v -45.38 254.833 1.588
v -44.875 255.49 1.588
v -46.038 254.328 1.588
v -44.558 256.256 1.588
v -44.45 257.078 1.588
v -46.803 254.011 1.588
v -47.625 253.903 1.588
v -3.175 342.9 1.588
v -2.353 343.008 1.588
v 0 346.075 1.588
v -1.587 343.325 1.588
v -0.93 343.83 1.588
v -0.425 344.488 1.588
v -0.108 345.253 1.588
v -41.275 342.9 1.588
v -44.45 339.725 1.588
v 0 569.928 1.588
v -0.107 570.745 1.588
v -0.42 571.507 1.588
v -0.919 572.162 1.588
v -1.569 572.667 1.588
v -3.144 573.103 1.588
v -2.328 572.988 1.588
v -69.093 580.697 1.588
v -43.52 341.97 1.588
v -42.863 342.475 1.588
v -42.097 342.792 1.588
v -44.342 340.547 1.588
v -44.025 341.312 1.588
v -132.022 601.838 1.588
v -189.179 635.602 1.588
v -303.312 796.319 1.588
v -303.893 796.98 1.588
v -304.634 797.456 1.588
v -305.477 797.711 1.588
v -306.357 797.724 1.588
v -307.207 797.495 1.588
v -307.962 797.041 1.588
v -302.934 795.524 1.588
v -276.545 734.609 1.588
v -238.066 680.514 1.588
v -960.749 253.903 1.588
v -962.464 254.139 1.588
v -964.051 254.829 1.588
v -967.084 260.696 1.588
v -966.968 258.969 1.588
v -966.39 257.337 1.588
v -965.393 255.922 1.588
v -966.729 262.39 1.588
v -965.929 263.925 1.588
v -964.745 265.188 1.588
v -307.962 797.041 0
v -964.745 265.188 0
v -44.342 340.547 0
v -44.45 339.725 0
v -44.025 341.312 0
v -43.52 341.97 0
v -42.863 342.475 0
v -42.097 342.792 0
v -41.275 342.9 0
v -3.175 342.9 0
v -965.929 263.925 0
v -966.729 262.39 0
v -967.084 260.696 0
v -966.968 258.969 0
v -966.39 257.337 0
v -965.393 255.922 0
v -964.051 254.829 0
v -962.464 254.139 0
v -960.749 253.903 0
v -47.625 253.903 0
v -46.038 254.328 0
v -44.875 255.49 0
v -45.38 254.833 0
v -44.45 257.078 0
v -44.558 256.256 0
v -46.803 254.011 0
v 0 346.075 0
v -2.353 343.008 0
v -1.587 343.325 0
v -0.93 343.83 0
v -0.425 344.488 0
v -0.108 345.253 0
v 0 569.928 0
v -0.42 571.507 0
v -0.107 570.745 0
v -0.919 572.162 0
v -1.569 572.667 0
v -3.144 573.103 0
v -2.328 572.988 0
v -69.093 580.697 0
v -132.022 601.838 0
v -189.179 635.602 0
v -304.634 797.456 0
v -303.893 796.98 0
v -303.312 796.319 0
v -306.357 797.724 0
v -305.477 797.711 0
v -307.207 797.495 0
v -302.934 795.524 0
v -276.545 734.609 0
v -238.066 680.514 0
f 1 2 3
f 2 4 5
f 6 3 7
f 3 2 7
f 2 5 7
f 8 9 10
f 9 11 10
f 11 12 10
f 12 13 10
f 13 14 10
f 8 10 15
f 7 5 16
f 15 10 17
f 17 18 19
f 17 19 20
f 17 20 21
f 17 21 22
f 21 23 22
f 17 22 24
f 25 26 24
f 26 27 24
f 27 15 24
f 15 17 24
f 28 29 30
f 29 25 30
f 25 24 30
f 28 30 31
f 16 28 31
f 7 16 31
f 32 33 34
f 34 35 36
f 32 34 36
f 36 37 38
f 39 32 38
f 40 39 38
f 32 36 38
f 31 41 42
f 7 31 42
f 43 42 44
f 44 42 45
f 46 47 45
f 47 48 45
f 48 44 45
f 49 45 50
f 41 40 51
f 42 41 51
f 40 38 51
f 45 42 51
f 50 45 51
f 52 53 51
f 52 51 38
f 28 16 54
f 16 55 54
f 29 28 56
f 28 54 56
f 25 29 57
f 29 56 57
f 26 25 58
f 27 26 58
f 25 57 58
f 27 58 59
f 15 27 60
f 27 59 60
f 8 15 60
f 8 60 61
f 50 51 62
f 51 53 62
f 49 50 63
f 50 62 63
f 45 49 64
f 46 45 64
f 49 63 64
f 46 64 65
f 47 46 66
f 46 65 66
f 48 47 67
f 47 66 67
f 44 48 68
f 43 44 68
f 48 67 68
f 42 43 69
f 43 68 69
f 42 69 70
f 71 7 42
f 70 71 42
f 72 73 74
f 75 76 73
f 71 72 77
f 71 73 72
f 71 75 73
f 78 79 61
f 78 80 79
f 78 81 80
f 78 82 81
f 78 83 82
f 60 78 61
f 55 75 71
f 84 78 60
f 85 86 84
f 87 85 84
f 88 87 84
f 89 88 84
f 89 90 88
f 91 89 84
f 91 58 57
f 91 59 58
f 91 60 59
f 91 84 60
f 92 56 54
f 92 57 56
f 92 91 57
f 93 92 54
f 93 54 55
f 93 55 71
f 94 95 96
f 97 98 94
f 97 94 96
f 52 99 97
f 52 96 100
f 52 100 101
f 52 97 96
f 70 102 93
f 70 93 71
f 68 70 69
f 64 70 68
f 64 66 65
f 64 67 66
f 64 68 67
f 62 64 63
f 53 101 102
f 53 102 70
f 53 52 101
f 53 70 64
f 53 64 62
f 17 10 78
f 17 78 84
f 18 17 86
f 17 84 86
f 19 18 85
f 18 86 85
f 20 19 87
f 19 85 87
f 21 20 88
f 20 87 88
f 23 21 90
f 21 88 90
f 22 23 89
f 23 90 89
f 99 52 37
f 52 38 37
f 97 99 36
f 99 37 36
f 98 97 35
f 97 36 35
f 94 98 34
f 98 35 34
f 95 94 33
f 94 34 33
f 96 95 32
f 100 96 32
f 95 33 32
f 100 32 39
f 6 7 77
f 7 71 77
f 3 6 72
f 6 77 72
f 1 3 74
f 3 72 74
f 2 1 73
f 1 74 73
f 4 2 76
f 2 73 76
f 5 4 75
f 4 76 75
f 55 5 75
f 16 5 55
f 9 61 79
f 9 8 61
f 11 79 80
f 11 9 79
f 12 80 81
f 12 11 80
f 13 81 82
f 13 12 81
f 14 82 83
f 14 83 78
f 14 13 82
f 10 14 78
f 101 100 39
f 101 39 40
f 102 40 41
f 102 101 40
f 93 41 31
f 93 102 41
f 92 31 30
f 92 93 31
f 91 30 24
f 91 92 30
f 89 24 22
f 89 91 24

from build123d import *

# Parameters (mm, degrees)
BOSS_EXTRUDE1_DEPTH = 1.5875
SKETCH2_W           = 88.9
SKETCH2_H           = 342.9
CUT_EXTRUDE1_DEPTH  = 2.5875
SKETCH4_W           = 1292.225
SKETCH4_H           = 800.002961837
CUT_EXTRUDE2_DEPTH  = 2.5875
CUT_EXTRUDE3_DEPTH  = 2.5875
FILLET1_R           = 3.175
FILLET2_R           = 6.35


with BuildPart() as part:
    # Sketch1 → Boss-Extrude1 (new body)
    with BuildSketch(Plane.XY):
        with BuildLine():
            Line((1292.225, 0), (-1292.225, 0))
            Line((-1292.225, 0), (-304.303617208, 800.002961837))
            ThreePointArc((-304.303617208, 800.002961837), (0, 573.0875), (304.303617208, 800.002961837))
            Line((304.303617208, 800.002961837), (1292.225, 0))
        make_face()
    extrude(amount=BOSS_EXTRUDE1_DEPTH)

    # Sketch2 → Cut-Extrude1 (cut, through all)
    with BuildSketch(Plane.XY.offset(1.5875)):
        with Locations((0, 171.45)):
            Rectangle(SKETCH2_W, SKETCH2_H)
    extrude(amount=-CUT_EXTRUDE1_DEPTH, mode=Mode.SUBTRACT)

    # Sketch4 → Cut-Extrude2 (cut, through all)
    with BuildSketch(Plane.XY.offset(1.5875)):
        with Locations((646.1125, 400.001480919)):
            Rectangle(SKETCH4_W, SKETCH4_H)
    extrude(amount=-CUT_EXTRUDE2_DEPTH, mode=Mode.SUBTRACT)

    # Sketch5 → Cut-Extrude3 (cut, through all)
    with BuildSketch(Plane.XY.offset(1.5875)):
        Polygon((-44.45, 253.902961837), (-978.680954392, 253.902961837), (-1292.225, 0), (-44.45, 0), align=None)
    extrude(amount=-CUT_EXTRUDE3_DEPTH, mode=Mode.SUBTRACT)

    # Fillet1
    fillet1_edges = [part.edges().sort_by_distance(p)[0] for p in [
        (-44.45, 342.9, 0.79375),
        (0, 342.9, 0.79375),
        (0, 573.0875, 0.79375),
        (-44.45, 253.902961837, 0.79375),
        (-304.303617208, 800.002961837, 0.79375),
    ]]
    fillet(fillet1_edges, radius=FILLET1_R)

    # Fillet2
    fillet2_edges = [part.edges().sort_by_distance(p)[0] for p in [
        (-978.680954392, 253.902961837, 0.79375),
    ]]
    fillet(fillet2_edges, radius=FILLET2_R)


solid = part.part
